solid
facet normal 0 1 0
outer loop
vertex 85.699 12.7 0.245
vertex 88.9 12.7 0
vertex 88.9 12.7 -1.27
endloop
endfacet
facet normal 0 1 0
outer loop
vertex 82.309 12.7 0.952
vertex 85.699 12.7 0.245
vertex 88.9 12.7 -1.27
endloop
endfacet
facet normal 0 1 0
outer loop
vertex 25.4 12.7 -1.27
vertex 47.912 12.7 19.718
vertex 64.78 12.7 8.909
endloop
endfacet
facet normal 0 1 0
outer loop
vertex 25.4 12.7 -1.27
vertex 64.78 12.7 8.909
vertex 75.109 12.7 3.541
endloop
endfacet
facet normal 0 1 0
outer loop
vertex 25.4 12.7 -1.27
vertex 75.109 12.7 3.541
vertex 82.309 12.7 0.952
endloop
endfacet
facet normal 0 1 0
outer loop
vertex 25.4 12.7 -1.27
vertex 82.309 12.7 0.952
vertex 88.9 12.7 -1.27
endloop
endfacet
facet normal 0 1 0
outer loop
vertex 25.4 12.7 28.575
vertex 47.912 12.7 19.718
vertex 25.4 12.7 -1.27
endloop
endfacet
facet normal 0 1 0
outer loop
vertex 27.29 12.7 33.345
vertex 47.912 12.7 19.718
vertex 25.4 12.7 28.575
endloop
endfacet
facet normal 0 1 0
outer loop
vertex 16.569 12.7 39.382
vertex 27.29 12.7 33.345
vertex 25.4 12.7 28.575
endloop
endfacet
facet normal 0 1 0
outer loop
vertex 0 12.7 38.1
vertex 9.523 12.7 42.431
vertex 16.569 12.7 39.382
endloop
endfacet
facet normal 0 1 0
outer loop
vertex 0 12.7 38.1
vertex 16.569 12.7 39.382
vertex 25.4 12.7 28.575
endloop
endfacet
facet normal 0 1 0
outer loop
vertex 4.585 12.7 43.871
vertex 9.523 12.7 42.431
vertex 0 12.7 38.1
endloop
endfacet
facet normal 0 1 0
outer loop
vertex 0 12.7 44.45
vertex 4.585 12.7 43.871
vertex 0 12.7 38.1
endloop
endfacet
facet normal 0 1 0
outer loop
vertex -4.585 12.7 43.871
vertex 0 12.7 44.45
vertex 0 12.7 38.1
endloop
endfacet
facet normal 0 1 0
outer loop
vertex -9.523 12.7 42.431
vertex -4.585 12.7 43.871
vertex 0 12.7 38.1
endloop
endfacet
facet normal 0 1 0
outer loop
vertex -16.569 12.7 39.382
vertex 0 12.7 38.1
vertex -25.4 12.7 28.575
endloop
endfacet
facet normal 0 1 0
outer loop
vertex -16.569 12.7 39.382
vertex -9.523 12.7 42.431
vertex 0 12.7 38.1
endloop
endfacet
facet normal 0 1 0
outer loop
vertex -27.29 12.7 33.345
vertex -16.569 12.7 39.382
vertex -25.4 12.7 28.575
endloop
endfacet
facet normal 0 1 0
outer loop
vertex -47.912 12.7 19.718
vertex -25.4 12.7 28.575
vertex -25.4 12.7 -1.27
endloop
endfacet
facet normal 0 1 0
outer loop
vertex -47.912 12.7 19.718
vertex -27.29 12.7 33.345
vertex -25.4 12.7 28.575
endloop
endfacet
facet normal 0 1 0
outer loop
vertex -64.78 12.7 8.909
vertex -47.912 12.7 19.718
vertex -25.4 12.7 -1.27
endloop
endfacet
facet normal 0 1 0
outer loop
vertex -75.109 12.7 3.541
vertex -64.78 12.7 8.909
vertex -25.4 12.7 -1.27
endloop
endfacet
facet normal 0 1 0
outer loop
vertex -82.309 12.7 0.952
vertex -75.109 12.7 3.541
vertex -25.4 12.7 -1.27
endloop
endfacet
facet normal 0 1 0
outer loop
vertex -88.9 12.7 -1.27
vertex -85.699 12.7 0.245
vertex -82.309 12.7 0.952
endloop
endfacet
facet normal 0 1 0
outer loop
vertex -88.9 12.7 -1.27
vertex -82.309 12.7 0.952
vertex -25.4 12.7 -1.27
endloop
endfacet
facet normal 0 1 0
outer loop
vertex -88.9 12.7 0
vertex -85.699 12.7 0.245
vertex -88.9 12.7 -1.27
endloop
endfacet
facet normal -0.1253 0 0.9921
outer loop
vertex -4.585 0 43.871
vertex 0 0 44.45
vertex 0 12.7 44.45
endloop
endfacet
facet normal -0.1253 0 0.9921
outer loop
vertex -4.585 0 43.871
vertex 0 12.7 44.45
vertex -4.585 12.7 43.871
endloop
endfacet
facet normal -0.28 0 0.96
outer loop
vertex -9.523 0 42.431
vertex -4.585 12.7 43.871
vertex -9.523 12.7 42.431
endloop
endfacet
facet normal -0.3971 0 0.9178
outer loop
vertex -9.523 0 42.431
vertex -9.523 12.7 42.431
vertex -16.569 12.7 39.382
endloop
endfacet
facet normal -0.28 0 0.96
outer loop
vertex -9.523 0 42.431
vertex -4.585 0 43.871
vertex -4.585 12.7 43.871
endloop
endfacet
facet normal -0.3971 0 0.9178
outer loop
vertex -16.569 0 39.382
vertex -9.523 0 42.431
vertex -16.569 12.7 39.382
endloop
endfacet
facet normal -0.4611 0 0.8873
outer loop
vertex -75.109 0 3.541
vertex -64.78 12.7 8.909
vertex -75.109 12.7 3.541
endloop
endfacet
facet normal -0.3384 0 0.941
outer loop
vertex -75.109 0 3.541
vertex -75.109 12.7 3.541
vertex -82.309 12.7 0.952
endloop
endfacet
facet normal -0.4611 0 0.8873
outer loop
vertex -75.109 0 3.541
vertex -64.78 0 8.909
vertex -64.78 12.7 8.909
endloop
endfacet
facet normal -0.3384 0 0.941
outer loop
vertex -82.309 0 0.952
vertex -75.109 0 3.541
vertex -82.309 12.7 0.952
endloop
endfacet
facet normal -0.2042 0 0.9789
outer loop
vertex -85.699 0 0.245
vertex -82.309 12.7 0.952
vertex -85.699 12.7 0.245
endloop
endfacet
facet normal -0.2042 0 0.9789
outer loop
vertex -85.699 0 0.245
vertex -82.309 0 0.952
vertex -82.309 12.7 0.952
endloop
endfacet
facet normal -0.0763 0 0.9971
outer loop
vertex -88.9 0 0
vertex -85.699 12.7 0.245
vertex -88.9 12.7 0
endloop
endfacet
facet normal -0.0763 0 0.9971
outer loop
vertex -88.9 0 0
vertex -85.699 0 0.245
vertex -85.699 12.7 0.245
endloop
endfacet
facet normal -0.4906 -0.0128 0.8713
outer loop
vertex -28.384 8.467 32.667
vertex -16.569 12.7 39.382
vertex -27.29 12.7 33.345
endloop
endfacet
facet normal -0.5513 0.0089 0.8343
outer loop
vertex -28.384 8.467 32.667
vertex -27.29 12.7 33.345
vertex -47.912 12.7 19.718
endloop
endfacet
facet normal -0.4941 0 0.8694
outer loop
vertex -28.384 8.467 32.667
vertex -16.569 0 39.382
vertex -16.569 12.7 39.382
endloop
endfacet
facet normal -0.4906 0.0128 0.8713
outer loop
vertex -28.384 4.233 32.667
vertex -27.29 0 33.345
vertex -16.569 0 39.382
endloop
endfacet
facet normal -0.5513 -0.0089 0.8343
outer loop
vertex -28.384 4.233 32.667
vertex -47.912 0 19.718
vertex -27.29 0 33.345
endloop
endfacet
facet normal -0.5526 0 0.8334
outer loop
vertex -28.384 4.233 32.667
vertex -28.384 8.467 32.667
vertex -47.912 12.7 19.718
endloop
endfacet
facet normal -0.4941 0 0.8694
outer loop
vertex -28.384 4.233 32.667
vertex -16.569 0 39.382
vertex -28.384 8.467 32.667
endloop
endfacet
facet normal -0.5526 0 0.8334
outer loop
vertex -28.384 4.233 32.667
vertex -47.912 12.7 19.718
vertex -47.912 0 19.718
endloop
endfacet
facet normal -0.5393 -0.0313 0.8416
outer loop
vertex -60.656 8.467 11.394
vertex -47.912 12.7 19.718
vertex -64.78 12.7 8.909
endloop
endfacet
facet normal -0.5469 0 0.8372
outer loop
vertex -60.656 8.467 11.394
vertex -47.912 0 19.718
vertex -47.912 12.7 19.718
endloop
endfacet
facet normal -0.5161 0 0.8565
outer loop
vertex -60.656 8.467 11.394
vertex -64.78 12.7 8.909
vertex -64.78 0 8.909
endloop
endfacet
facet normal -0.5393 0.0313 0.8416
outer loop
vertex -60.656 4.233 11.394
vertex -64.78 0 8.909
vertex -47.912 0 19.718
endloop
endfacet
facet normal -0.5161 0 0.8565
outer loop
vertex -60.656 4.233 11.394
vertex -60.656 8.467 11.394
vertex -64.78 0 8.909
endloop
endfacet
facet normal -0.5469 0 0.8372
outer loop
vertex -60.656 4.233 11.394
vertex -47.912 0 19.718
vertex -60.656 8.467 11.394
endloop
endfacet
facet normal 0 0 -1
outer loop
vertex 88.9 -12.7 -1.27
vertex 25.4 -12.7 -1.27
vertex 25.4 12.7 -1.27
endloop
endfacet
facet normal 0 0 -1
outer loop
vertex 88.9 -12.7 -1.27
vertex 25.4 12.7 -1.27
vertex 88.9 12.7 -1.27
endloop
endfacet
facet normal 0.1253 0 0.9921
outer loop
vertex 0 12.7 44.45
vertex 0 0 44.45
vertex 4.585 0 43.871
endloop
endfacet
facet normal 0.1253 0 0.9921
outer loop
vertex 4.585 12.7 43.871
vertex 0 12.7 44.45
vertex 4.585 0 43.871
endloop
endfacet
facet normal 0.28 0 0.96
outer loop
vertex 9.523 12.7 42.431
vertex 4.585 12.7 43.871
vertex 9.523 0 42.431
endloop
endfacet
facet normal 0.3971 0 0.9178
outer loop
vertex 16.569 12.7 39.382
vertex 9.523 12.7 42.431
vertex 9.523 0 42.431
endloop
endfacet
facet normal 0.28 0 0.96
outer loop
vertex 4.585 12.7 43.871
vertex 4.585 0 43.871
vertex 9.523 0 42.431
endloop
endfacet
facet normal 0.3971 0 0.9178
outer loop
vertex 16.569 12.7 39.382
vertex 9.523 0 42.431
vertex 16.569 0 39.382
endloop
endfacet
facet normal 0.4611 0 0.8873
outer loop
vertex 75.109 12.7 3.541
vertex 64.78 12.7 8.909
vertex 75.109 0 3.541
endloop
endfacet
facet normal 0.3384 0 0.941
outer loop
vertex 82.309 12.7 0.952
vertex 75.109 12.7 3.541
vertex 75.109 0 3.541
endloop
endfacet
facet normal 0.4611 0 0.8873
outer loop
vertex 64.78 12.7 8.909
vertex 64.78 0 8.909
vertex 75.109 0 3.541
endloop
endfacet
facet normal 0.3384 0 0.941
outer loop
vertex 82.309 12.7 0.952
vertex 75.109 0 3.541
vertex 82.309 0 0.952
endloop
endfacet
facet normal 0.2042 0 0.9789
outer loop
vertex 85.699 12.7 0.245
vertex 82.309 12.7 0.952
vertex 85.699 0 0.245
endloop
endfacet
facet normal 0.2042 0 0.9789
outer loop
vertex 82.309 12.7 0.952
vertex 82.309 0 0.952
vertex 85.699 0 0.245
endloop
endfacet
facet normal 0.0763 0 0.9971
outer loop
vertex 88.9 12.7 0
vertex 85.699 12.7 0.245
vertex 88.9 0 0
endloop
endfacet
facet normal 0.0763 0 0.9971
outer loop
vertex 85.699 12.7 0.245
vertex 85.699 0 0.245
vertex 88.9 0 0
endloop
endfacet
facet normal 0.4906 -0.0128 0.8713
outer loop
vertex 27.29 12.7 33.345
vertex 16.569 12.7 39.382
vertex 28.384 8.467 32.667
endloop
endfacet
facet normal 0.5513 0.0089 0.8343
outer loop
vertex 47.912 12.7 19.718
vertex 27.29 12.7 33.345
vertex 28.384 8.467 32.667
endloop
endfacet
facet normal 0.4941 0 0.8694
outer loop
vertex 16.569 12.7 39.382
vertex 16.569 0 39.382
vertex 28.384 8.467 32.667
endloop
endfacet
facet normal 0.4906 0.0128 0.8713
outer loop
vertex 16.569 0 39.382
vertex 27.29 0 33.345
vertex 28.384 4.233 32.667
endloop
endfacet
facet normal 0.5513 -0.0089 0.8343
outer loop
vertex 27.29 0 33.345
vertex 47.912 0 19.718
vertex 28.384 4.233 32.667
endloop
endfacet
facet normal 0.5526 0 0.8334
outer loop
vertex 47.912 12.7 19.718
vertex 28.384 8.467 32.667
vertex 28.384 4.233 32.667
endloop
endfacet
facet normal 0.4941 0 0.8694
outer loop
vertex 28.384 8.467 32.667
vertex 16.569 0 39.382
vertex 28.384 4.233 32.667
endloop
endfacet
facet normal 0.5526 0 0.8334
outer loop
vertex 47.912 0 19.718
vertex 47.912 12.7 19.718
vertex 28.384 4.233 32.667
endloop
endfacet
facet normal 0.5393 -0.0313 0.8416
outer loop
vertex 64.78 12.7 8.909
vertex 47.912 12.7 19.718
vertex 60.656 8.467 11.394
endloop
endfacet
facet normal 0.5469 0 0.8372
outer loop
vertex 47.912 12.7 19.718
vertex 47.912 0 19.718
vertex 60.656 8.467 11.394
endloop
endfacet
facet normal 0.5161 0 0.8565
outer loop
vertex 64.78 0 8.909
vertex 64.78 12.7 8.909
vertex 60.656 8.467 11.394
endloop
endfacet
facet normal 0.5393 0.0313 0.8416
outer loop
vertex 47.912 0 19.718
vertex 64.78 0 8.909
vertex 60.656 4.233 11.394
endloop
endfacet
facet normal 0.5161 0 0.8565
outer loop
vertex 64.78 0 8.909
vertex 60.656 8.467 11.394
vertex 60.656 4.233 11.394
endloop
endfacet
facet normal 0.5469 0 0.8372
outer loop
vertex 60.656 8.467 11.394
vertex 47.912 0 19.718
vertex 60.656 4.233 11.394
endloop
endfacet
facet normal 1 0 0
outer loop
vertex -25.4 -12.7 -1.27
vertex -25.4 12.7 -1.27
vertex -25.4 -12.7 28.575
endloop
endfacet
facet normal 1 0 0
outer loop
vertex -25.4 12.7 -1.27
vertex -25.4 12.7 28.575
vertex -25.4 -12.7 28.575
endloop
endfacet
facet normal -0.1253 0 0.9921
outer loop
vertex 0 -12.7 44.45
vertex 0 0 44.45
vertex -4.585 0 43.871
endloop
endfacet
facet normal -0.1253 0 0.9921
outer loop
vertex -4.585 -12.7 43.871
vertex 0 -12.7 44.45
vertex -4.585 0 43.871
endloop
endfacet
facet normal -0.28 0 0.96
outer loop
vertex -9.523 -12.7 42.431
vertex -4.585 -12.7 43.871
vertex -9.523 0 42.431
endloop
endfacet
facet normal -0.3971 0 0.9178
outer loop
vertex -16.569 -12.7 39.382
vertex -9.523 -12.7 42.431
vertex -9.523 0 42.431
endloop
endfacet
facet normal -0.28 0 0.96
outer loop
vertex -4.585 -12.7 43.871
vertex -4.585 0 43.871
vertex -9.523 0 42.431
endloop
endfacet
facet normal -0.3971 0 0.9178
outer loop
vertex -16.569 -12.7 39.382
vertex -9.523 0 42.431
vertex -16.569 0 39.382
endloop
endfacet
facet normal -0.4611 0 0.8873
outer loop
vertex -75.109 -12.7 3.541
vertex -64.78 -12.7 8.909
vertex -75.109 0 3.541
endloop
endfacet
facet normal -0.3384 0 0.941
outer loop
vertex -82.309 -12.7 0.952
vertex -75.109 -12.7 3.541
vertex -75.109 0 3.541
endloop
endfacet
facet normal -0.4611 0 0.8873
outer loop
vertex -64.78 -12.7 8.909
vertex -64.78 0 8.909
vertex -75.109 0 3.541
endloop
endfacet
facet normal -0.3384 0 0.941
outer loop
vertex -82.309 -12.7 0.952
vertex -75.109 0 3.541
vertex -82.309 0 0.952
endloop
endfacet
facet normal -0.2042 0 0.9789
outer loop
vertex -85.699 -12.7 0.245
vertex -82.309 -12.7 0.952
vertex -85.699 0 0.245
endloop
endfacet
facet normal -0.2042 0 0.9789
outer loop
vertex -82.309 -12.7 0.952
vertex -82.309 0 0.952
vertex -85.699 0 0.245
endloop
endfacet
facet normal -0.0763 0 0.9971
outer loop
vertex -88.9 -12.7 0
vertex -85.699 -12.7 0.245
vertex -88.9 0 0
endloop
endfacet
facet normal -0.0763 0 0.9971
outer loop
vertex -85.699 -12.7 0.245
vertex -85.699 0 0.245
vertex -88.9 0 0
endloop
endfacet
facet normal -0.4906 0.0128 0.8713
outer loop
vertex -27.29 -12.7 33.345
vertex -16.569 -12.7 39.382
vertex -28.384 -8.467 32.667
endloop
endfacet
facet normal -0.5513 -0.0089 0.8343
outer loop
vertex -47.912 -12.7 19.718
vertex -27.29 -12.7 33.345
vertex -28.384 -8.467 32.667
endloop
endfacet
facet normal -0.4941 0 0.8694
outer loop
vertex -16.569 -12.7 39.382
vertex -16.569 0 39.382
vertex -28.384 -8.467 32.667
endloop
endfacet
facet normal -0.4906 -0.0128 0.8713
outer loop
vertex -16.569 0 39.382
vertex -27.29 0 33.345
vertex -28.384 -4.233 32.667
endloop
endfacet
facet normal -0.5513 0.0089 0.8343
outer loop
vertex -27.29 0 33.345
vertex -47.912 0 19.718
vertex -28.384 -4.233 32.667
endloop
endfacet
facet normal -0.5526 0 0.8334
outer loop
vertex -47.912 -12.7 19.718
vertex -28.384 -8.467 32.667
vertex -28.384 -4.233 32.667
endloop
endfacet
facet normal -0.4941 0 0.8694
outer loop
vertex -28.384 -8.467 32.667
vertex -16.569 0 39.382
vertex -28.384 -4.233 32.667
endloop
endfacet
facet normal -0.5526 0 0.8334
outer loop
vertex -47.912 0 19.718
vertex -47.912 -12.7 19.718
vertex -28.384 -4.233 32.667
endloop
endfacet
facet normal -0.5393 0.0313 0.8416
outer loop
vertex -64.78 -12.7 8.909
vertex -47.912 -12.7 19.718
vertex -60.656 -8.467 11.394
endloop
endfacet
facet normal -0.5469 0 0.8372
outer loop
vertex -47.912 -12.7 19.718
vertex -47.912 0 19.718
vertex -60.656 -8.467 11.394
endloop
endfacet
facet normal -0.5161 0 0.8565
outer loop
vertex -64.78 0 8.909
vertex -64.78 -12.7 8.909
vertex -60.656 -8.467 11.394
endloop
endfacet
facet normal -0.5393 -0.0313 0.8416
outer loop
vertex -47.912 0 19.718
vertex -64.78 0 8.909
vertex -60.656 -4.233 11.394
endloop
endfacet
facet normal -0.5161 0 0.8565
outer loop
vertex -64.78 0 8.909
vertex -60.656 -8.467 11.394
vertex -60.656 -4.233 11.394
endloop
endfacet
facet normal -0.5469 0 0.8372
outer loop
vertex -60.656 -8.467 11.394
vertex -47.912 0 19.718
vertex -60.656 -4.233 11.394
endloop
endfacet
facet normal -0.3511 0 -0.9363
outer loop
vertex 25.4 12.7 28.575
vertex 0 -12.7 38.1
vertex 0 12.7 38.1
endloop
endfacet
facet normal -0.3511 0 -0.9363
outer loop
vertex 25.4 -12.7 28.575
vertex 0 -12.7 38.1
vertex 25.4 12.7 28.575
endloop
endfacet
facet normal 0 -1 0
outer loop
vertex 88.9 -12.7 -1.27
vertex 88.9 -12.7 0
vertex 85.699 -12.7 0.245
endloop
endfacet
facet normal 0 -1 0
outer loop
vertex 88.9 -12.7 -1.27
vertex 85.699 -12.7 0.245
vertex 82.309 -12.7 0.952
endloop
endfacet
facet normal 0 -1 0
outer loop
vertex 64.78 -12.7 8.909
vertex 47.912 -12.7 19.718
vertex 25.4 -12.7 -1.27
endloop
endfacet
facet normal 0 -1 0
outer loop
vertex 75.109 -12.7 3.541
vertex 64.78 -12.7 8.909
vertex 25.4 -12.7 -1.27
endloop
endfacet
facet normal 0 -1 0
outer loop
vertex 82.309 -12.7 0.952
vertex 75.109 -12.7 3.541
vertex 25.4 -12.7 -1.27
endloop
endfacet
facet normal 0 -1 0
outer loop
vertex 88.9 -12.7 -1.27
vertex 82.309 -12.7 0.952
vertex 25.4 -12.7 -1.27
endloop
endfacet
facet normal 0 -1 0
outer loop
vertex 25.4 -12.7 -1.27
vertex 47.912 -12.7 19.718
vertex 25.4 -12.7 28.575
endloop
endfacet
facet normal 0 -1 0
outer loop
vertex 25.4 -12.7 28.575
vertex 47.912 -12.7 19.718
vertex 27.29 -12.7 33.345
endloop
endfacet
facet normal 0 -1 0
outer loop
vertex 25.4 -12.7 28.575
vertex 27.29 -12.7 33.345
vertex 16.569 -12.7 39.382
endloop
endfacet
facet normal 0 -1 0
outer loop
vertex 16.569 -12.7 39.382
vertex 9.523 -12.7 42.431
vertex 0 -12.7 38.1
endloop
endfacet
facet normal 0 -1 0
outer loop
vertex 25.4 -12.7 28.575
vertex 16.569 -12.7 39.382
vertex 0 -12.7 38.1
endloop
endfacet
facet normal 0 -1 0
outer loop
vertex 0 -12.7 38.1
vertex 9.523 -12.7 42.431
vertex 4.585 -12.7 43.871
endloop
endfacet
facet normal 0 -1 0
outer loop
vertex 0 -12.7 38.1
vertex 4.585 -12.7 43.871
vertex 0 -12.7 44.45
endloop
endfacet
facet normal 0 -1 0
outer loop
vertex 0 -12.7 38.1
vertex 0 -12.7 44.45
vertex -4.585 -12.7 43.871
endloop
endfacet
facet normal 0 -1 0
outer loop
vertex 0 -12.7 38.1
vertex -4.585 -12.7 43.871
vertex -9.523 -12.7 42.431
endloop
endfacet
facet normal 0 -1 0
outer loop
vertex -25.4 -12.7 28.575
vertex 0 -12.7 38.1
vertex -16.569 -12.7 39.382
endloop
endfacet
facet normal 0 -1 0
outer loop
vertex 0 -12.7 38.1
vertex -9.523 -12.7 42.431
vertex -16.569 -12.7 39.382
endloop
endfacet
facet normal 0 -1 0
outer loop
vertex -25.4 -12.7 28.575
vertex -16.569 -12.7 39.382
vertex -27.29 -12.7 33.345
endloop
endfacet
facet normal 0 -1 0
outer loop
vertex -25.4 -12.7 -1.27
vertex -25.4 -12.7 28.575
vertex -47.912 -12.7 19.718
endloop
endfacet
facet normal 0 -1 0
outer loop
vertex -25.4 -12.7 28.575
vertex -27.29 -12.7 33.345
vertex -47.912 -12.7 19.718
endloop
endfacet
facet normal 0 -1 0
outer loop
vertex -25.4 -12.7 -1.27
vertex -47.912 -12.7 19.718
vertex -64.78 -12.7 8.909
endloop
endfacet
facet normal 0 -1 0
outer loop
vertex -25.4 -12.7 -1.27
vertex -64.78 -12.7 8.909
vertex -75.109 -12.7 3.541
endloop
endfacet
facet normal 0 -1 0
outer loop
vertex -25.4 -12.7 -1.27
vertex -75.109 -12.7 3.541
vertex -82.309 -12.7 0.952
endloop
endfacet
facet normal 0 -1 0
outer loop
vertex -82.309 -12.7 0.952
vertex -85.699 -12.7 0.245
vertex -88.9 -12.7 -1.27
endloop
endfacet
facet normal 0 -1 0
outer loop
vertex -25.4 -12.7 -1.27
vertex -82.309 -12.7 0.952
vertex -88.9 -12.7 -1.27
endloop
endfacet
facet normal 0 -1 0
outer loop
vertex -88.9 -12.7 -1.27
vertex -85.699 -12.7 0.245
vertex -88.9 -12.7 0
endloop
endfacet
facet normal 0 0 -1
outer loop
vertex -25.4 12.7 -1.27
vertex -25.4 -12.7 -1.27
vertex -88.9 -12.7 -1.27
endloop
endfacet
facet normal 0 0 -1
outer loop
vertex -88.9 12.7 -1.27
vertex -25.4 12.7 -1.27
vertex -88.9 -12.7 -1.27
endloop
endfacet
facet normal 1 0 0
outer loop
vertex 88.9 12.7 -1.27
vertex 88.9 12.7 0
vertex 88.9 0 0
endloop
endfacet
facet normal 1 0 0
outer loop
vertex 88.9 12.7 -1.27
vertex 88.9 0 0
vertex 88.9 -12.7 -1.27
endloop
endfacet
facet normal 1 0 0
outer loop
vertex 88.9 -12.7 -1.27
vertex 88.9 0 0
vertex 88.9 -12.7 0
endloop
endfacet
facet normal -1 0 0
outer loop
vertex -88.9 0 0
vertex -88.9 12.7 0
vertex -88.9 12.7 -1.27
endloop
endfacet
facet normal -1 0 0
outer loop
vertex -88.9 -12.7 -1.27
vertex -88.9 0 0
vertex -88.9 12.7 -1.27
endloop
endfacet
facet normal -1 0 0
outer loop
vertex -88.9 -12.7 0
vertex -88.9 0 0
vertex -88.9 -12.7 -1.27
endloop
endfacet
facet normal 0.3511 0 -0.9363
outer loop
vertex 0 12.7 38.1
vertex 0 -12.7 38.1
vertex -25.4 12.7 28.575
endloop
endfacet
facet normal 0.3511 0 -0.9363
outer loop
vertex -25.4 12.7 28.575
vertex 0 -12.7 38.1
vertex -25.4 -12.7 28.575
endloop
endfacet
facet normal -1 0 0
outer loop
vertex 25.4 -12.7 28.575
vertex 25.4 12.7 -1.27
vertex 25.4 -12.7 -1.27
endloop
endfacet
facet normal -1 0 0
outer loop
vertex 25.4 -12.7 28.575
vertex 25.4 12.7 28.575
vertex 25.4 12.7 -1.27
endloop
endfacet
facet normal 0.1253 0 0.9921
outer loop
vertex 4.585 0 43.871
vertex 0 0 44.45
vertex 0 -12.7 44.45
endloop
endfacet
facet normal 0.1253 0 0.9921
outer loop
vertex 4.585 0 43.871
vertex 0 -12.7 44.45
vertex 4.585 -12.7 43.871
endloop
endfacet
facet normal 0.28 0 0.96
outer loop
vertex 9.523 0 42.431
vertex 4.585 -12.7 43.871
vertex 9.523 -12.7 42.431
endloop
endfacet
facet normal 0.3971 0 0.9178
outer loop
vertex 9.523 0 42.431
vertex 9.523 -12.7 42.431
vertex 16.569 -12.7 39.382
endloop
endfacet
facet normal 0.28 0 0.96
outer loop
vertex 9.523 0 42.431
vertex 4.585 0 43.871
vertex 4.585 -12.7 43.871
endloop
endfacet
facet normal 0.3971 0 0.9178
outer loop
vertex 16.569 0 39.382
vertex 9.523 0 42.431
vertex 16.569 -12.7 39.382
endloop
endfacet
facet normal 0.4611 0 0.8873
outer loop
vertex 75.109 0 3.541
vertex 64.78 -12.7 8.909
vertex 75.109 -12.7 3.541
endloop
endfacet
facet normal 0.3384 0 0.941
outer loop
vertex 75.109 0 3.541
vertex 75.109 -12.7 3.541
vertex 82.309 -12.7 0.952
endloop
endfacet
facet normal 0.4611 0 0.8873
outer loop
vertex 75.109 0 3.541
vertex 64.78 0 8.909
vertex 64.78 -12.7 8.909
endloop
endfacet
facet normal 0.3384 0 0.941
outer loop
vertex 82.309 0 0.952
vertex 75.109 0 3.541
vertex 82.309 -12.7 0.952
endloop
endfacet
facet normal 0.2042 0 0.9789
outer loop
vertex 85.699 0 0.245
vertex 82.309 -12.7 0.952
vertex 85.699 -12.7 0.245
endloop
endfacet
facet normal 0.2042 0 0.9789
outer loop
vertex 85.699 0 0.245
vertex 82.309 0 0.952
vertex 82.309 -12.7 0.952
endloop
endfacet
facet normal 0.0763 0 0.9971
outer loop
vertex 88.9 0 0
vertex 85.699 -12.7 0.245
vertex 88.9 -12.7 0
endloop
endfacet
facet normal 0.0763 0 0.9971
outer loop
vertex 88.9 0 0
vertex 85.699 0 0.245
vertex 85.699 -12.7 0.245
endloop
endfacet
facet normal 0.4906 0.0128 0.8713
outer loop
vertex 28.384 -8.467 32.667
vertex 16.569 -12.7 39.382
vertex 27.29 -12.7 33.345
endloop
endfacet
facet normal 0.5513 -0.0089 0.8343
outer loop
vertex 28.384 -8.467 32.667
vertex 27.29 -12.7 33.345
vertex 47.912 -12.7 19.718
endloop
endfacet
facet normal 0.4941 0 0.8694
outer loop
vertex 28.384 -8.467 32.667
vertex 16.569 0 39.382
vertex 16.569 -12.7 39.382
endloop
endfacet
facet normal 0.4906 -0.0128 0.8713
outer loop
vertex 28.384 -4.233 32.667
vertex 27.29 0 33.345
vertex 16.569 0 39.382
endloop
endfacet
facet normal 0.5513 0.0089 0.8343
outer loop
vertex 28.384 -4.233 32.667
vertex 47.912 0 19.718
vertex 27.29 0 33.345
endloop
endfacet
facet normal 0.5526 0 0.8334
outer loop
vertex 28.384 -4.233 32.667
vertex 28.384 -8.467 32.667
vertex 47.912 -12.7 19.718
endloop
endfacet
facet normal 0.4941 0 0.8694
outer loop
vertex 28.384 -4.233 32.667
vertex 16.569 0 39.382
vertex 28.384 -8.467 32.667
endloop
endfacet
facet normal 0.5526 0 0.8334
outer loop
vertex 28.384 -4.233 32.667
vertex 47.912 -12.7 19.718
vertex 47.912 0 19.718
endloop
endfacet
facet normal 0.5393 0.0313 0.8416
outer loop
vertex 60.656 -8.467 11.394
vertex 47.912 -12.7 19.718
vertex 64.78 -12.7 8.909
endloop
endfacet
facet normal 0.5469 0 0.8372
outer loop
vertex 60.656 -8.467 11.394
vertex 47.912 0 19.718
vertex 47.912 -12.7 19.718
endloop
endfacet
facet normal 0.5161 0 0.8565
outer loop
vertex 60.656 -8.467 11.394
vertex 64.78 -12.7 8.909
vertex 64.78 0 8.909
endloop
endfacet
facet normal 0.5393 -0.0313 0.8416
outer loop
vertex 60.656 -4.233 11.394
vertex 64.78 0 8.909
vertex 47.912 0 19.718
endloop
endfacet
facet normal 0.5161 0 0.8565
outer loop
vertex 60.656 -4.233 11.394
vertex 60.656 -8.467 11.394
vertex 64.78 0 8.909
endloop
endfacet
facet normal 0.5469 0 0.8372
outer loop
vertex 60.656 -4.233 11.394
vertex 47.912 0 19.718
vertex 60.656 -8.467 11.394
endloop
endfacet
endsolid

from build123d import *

# Parameters (mm, degrees)
F1_DEPTH = 12.7
F2_W     = 63.5
F2_H     = 25.4
F3_DEPTH = 1.27


with BuildPart() as f1:
    # F0 (on Front) → F1 (new body, symmetric)
    with BuildSketch(Plane.XZ):
        with BuildLine():
            Line((25.4, 28.575), (25.4, 0))
            Line((25.4, 0), (88.9, 0))
            add(Edge.make_bspline(
                [(0, 44.45), (23.8007288426, 43.8667871058), (65.3088388513, 0), (88.9, 0)],
                knots=[0, 0, 0, 0, 99.3932215999, 99.3932215999, 99.3932215999, 99.3932215999], degree=3))
            Line((0, 44.45), (0, 38.1))
            Line((0, 38.1), (25.4, 28.575))
        make_face()
    extrude(amount=F1_DEPTH, both=True)

    # F2 (on face) → F3 (join)
    with BuildSketch(Plane(origin=(0, 0, 0), x_dir=(1, 0, 0), z_dir=(0, 0, -1))):
        with Locations((57.15, 0)):
            Rectangle(F2_W, F2_H)
    extrude(amount=F3_DEPTH)

    # F4: F1 across face


with BuildPart() as f1_1:
    add(f1.part)
    add(f1.part.mirror(Plane(origin=(0, 0, 41.275), x_dir=(0, -1, 0), z_dir=(-1, 0, 0))))


solid = f1_1.part
